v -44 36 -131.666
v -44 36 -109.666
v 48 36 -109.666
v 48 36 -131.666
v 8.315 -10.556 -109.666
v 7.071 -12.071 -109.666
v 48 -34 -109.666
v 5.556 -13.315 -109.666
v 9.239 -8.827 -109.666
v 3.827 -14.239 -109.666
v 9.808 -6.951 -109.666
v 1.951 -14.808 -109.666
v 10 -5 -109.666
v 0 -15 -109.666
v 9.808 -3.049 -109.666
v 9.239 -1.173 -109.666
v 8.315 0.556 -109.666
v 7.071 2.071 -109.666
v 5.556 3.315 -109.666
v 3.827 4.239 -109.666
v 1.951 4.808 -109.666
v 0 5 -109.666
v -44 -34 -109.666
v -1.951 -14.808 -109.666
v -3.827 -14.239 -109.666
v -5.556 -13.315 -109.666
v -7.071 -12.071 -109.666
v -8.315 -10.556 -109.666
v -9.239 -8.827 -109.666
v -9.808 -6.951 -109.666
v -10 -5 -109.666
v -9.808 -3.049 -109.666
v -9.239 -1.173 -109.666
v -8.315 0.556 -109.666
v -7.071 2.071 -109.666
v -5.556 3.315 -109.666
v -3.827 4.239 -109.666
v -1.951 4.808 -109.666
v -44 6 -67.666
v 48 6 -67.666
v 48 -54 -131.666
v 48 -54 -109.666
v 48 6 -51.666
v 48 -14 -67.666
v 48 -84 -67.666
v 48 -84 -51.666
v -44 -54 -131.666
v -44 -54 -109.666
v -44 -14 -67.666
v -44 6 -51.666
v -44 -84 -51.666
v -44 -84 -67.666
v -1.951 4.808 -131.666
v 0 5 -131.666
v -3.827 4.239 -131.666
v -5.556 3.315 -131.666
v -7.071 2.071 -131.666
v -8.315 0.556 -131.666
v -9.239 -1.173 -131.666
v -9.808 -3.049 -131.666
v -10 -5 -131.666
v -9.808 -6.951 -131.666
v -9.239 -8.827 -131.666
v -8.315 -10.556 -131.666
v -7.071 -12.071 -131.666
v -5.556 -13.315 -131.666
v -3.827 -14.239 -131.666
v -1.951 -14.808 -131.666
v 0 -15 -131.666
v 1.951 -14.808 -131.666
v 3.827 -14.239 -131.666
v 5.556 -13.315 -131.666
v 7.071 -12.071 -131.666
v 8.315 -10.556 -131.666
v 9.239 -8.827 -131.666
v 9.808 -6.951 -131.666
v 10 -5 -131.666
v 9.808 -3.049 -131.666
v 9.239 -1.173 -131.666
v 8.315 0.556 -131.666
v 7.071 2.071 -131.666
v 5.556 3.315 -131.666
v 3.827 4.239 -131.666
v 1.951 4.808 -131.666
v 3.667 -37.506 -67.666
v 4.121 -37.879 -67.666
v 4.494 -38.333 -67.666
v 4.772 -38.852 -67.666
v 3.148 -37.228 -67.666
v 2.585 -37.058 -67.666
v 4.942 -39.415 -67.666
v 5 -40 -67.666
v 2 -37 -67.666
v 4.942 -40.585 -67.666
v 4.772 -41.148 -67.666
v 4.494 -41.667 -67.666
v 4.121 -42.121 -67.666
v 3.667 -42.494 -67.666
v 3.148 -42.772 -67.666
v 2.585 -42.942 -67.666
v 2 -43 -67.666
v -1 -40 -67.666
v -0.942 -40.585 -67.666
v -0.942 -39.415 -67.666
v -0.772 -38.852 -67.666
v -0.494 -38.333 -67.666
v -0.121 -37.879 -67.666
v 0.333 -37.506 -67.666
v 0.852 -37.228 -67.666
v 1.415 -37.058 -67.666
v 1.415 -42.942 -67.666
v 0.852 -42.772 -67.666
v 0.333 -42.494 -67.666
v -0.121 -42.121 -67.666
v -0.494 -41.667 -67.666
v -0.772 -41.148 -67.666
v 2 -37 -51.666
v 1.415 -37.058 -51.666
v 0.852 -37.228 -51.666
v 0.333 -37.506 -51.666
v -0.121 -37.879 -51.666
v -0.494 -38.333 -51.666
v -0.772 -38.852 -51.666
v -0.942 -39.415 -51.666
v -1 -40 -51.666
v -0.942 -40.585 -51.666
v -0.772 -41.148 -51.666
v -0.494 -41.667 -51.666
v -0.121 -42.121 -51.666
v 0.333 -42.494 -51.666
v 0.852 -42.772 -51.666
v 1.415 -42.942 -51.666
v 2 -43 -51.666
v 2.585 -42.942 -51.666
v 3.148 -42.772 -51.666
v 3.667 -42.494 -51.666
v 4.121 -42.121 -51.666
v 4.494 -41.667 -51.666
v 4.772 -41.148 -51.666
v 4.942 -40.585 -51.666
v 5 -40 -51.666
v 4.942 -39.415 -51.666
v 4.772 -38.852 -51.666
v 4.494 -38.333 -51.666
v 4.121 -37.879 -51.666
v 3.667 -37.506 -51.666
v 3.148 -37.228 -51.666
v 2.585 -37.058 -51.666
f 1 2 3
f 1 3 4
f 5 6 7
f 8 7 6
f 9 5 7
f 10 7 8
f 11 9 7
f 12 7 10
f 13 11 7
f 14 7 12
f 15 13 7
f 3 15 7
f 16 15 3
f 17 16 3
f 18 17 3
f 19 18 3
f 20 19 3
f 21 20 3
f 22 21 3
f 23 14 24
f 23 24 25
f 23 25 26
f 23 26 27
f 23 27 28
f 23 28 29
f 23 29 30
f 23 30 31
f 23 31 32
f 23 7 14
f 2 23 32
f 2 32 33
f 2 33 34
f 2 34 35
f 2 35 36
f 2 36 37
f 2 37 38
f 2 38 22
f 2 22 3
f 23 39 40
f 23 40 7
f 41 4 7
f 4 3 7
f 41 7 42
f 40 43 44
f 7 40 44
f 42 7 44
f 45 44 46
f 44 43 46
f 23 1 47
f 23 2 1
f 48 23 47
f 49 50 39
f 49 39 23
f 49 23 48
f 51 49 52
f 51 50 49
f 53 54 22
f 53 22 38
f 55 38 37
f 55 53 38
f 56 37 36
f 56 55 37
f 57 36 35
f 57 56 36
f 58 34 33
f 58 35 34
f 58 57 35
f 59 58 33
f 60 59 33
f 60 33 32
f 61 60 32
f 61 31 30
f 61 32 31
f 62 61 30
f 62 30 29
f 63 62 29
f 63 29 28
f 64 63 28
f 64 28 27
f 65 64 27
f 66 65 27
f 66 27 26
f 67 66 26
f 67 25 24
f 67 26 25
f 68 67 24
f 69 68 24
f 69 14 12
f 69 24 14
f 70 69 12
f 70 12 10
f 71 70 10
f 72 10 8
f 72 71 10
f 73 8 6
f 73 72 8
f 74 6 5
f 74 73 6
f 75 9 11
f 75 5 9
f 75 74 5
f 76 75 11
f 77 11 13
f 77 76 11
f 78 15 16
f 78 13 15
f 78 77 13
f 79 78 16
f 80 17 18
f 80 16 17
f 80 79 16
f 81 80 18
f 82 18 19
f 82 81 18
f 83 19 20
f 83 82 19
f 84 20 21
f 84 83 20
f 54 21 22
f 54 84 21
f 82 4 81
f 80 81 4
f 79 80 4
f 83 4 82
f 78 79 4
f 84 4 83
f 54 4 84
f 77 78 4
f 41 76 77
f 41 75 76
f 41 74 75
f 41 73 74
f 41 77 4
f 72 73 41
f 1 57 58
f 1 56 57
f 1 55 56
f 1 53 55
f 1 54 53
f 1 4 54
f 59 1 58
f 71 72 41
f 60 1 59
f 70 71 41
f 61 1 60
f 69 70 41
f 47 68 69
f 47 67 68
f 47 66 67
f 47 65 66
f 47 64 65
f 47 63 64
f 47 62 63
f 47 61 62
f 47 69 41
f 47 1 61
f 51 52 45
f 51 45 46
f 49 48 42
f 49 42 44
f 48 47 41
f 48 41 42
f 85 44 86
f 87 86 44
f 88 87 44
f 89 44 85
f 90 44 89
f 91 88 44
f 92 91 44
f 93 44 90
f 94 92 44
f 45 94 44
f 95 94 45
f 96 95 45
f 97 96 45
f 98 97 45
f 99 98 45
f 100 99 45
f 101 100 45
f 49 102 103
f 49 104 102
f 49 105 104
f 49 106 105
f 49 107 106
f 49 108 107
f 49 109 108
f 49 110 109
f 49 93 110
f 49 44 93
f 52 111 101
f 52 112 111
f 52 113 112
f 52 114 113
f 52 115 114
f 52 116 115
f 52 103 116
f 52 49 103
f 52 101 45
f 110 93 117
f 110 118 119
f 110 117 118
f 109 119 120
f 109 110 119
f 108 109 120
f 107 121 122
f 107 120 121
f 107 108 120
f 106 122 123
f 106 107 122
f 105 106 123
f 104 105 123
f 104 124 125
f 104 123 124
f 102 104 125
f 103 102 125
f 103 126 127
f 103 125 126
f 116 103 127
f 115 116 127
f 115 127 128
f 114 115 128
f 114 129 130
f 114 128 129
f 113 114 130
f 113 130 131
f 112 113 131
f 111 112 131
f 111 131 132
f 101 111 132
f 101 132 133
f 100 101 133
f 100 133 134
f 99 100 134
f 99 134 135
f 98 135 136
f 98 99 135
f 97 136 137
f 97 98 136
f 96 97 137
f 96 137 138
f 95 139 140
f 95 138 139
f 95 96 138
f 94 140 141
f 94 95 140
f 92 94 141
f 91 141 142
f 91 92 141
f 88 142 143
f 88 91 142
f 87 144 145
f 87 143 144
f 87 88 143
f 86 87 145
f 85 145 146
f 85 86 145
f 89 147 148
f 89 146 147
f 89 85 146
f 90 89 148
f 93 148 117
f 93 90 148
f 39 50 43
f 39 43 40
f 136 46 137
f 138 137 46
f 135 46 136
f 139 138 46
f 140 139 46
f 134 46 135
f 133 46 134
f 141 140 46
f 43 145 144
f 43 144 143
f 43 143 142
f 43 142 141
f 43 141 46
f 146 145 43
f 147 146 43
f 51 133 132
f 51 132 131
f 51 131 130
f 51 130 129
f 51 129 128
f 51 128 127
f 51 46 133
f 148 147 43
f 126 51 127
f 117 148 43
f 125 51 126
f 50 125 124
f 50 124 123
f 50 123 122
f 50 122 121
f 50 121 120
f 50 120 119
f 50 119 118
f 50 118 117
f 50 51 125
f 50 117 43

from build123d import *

# Parameters (mm, degrees)
CYLINDER001_R          = 3
CYLINDER001_DEPTH      = 20
CYLINDER_R             = 10
CYLINDER_DEPTH         = 50
PAD008_DEPTH           = 92
CUT002_PLACEMENT_ANGLE = 90


with BuildPart() as cylinder001:
    # Cylinder001 → Cylinder001 (new body)
    with BuildSketch(Plane(origin=(-31, -46, 34), x_dir=(1, 0, 0), z_dir=(0, 0, 1))):
        Circle(CYLINDER001_R)
    extrude(amount=CYLINDER001_DEPTH)


with BuildPart() as cylinder:
    # Cylinder → Cylinder (new body)
    with BuildSketch(Plane(origin=(4, -44, -38), x_dir=(1, 0, 0), z_dir=(0, 0, 1))):
        Circle(CYLINDER_R)
    extrude(amount=CYLINDER_DEPTH)


with BuildPart() as stand001:
    # Sketch009 → Pad008 (new body)
    with BuildSketch(Plane.XZ):
        Polygon((45, -27.665999), (-45, -27.665999), (-45, -5.665999), (-5, 36.334001), (-75, 36.334001), (-75, 52.334001), (15, 52.334001), (15, 36.334001), (-25, -5.665999), (45, -5.665999), align=None)
    extrude(amount=PAD008_DEPTH)

    # Cut001: cut Cylinder
    add(cylinder.part, mode=Mode.SUBTRACT)

    # Cut002: cut Cylinder001
    add(cylinder001.part, mode=Mode.SUBTRACT)


with BuildPart() as stand001_1:
    # Cut002 placement: moved
    add(stand001.part.moved(Location((-44, -9, -104))).rotate(Axis((-44, -9, -104), (0, 0, 1)), CUT002_PLACEMENT_ANGLE))


solid = stand001_1.part
